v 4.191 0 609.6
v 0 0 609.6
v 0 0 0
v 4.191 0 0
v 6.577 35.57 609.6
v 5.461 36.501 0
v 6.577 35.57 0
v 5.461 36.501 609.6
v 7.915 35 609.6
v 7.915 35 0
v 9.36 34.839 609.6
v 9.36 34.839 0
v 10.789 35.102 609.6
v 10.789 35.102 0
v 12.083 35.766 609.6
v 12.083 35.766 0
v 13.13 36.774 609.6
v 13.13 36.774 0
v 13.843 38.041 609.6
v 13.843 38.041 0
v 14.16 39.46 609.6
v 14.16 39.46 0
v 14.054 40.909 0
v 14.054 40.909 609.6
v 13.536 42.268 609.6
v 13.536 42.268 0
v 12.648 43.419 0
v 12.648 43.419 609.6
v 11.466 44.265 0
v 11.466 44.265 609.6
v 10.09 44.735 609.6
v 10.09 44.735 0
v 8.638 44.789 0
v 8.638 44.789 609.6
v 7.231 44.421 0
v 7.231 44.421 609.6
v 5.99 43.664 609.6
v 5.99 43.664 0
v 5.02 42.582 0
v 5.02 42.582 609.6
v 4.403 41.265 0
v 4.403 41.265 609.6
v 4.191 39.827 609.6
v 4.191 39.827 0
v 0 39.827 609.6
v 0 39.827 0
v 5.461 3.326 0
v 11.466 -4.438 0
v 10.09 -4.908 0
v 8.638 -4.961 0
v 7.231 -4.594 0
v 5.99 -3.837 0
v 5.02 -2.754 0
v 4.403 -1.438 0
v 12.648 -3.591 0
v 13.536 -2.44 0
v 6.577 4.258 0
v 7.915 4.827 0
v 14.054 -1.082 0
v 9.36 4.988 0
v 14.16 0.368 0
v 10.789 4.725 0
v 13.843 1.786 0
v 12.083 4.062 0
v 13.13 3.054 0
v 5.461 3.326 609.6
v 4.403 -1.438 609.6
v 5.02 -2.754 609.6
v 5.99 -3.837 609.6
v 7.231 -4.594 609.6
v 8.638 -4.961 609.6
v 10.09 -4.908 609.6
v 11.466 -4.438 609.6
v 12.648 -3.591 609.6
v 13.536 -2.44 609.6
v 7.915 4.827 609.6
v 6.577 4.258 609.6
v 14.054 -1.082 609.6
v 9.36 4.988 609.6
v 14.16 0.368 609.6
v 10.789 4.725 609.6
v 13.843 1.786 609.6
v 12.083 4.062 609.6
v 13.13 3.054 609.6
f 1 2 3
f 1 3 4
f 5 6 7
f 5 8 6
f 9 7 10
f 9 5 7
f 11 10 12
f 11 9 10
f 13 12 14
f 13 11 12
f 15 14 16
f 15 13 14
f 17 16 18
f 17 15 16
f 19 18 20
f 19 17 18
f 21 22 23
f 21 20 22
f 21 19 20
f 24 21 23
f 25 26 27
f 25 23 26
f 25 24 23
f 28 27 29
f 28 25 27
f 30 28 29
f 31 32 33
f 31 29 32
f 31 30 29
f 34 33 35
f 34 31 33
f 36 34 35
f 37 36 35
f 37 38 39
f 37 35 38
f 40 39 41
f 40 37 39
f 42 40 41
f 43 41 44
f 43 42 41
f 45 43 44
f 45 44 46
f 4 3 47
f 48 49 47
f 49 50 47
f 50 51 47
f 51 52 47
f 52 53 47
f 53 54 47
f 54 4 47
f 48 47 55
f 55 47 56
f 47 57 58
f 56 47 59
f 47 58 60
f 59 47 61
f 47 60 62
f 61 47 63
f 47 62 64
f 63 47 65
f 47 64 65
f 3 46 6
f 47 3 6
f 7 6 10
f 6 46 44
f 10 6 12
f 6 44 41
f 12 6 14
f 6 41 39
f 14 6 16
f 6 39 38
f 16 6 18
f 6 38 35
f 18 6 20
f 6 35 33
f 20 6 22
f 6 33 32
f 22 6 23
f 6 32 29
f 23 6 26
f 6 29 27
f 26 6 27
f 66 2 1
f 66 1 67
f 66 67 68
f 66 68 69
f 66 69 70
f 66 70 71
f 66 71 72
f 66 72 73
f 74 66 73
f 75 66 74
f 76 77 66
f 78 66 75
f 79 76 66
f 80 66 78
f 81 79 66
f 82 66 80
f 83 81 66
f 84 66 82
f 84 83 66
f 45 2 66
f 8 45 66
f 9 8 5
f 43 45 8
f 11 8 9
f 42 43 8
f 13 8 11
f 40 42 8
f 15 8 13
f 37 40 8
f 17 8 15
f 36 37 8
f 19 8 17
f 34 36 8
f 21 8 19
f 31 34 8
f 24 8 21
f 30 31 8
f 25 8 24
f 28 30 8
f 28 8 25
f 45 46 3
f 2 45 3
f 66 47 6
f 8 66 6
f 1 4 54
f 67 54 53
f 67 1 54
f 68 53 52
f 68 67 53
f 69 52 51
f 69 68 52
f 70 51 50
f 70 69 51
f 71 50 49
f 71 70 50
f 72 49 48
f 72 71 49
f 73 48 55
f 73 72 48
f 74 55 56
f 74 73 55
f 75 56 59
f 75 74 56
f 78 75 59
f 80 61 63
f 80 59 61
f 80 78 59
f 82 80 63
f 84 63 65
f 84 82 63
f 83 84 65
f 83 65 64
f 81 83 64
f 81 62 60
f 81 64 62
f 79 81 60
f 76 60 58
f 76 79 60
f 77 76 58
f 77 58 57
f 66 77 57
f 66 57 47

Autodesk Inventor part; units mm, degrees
ref_plane "YZ Plane" through (0, 0, 0) normal (1, 0, 0) x (0, 1, 0)
ref_plane "XZ Plane" through (0, 0, 0) normal (0, 1, 0) x (-1, 0, 0)
ref_plane "XY Plane" through (0, 0, 0) normal (0, 0, 1) x (1, 0, 0)
sketch "Sketch1" plane through (0, 0, 0) normal (0, 0, 1) x (1, 0, 0)
  line L0 (0, 0) -> (5.461, 0)
  line L1 (5.461, 0) -> (5.461, 39.8272)
  line L2 (5.461, 39.8272) -> (0, 39.8272)
  line L3 (0, 39.8272) -> (0, 0)
  dimension "d0" = 5.461
  dimension "d1" = 39.8272
extrude "Extrusion1" add sketch "Sketch1" along normal blind 609.6
sketch "Sketch2" plane through (0, 0, 609.6) normal (0, 0, 1) x (1, 0, 0)
  line L0 (5.461, 0) -> (5.461, 39.8272) projected
  line L1 (5.461, 0) -> (4.191, 0) construction
  line L2 (0, 0) -> (5.461, 0) projected
  line L3 (4.191, 0) -> (9.1821, 0) construction
  circle A0 centre (9.1821, 0) radius 4.9911
  line L4 (5.461, 19.9136) -> (0, 19.9136) construction
  line L5 (0, 39.8272) -> (0, 0) construction
  line L6 (5.461, 39.8272) -> (4.191, 39.8272) construction
  circle A1 centre (9.1821, 39.8272) radius 4.9911
  dimension "d4" = 1.27
  dimension "d5" = 4.9911
extrude "Extrusion2" add sketch "Sketch2" against normal blind 609.6
properties part number "Linear Guide Rail Temporary"
